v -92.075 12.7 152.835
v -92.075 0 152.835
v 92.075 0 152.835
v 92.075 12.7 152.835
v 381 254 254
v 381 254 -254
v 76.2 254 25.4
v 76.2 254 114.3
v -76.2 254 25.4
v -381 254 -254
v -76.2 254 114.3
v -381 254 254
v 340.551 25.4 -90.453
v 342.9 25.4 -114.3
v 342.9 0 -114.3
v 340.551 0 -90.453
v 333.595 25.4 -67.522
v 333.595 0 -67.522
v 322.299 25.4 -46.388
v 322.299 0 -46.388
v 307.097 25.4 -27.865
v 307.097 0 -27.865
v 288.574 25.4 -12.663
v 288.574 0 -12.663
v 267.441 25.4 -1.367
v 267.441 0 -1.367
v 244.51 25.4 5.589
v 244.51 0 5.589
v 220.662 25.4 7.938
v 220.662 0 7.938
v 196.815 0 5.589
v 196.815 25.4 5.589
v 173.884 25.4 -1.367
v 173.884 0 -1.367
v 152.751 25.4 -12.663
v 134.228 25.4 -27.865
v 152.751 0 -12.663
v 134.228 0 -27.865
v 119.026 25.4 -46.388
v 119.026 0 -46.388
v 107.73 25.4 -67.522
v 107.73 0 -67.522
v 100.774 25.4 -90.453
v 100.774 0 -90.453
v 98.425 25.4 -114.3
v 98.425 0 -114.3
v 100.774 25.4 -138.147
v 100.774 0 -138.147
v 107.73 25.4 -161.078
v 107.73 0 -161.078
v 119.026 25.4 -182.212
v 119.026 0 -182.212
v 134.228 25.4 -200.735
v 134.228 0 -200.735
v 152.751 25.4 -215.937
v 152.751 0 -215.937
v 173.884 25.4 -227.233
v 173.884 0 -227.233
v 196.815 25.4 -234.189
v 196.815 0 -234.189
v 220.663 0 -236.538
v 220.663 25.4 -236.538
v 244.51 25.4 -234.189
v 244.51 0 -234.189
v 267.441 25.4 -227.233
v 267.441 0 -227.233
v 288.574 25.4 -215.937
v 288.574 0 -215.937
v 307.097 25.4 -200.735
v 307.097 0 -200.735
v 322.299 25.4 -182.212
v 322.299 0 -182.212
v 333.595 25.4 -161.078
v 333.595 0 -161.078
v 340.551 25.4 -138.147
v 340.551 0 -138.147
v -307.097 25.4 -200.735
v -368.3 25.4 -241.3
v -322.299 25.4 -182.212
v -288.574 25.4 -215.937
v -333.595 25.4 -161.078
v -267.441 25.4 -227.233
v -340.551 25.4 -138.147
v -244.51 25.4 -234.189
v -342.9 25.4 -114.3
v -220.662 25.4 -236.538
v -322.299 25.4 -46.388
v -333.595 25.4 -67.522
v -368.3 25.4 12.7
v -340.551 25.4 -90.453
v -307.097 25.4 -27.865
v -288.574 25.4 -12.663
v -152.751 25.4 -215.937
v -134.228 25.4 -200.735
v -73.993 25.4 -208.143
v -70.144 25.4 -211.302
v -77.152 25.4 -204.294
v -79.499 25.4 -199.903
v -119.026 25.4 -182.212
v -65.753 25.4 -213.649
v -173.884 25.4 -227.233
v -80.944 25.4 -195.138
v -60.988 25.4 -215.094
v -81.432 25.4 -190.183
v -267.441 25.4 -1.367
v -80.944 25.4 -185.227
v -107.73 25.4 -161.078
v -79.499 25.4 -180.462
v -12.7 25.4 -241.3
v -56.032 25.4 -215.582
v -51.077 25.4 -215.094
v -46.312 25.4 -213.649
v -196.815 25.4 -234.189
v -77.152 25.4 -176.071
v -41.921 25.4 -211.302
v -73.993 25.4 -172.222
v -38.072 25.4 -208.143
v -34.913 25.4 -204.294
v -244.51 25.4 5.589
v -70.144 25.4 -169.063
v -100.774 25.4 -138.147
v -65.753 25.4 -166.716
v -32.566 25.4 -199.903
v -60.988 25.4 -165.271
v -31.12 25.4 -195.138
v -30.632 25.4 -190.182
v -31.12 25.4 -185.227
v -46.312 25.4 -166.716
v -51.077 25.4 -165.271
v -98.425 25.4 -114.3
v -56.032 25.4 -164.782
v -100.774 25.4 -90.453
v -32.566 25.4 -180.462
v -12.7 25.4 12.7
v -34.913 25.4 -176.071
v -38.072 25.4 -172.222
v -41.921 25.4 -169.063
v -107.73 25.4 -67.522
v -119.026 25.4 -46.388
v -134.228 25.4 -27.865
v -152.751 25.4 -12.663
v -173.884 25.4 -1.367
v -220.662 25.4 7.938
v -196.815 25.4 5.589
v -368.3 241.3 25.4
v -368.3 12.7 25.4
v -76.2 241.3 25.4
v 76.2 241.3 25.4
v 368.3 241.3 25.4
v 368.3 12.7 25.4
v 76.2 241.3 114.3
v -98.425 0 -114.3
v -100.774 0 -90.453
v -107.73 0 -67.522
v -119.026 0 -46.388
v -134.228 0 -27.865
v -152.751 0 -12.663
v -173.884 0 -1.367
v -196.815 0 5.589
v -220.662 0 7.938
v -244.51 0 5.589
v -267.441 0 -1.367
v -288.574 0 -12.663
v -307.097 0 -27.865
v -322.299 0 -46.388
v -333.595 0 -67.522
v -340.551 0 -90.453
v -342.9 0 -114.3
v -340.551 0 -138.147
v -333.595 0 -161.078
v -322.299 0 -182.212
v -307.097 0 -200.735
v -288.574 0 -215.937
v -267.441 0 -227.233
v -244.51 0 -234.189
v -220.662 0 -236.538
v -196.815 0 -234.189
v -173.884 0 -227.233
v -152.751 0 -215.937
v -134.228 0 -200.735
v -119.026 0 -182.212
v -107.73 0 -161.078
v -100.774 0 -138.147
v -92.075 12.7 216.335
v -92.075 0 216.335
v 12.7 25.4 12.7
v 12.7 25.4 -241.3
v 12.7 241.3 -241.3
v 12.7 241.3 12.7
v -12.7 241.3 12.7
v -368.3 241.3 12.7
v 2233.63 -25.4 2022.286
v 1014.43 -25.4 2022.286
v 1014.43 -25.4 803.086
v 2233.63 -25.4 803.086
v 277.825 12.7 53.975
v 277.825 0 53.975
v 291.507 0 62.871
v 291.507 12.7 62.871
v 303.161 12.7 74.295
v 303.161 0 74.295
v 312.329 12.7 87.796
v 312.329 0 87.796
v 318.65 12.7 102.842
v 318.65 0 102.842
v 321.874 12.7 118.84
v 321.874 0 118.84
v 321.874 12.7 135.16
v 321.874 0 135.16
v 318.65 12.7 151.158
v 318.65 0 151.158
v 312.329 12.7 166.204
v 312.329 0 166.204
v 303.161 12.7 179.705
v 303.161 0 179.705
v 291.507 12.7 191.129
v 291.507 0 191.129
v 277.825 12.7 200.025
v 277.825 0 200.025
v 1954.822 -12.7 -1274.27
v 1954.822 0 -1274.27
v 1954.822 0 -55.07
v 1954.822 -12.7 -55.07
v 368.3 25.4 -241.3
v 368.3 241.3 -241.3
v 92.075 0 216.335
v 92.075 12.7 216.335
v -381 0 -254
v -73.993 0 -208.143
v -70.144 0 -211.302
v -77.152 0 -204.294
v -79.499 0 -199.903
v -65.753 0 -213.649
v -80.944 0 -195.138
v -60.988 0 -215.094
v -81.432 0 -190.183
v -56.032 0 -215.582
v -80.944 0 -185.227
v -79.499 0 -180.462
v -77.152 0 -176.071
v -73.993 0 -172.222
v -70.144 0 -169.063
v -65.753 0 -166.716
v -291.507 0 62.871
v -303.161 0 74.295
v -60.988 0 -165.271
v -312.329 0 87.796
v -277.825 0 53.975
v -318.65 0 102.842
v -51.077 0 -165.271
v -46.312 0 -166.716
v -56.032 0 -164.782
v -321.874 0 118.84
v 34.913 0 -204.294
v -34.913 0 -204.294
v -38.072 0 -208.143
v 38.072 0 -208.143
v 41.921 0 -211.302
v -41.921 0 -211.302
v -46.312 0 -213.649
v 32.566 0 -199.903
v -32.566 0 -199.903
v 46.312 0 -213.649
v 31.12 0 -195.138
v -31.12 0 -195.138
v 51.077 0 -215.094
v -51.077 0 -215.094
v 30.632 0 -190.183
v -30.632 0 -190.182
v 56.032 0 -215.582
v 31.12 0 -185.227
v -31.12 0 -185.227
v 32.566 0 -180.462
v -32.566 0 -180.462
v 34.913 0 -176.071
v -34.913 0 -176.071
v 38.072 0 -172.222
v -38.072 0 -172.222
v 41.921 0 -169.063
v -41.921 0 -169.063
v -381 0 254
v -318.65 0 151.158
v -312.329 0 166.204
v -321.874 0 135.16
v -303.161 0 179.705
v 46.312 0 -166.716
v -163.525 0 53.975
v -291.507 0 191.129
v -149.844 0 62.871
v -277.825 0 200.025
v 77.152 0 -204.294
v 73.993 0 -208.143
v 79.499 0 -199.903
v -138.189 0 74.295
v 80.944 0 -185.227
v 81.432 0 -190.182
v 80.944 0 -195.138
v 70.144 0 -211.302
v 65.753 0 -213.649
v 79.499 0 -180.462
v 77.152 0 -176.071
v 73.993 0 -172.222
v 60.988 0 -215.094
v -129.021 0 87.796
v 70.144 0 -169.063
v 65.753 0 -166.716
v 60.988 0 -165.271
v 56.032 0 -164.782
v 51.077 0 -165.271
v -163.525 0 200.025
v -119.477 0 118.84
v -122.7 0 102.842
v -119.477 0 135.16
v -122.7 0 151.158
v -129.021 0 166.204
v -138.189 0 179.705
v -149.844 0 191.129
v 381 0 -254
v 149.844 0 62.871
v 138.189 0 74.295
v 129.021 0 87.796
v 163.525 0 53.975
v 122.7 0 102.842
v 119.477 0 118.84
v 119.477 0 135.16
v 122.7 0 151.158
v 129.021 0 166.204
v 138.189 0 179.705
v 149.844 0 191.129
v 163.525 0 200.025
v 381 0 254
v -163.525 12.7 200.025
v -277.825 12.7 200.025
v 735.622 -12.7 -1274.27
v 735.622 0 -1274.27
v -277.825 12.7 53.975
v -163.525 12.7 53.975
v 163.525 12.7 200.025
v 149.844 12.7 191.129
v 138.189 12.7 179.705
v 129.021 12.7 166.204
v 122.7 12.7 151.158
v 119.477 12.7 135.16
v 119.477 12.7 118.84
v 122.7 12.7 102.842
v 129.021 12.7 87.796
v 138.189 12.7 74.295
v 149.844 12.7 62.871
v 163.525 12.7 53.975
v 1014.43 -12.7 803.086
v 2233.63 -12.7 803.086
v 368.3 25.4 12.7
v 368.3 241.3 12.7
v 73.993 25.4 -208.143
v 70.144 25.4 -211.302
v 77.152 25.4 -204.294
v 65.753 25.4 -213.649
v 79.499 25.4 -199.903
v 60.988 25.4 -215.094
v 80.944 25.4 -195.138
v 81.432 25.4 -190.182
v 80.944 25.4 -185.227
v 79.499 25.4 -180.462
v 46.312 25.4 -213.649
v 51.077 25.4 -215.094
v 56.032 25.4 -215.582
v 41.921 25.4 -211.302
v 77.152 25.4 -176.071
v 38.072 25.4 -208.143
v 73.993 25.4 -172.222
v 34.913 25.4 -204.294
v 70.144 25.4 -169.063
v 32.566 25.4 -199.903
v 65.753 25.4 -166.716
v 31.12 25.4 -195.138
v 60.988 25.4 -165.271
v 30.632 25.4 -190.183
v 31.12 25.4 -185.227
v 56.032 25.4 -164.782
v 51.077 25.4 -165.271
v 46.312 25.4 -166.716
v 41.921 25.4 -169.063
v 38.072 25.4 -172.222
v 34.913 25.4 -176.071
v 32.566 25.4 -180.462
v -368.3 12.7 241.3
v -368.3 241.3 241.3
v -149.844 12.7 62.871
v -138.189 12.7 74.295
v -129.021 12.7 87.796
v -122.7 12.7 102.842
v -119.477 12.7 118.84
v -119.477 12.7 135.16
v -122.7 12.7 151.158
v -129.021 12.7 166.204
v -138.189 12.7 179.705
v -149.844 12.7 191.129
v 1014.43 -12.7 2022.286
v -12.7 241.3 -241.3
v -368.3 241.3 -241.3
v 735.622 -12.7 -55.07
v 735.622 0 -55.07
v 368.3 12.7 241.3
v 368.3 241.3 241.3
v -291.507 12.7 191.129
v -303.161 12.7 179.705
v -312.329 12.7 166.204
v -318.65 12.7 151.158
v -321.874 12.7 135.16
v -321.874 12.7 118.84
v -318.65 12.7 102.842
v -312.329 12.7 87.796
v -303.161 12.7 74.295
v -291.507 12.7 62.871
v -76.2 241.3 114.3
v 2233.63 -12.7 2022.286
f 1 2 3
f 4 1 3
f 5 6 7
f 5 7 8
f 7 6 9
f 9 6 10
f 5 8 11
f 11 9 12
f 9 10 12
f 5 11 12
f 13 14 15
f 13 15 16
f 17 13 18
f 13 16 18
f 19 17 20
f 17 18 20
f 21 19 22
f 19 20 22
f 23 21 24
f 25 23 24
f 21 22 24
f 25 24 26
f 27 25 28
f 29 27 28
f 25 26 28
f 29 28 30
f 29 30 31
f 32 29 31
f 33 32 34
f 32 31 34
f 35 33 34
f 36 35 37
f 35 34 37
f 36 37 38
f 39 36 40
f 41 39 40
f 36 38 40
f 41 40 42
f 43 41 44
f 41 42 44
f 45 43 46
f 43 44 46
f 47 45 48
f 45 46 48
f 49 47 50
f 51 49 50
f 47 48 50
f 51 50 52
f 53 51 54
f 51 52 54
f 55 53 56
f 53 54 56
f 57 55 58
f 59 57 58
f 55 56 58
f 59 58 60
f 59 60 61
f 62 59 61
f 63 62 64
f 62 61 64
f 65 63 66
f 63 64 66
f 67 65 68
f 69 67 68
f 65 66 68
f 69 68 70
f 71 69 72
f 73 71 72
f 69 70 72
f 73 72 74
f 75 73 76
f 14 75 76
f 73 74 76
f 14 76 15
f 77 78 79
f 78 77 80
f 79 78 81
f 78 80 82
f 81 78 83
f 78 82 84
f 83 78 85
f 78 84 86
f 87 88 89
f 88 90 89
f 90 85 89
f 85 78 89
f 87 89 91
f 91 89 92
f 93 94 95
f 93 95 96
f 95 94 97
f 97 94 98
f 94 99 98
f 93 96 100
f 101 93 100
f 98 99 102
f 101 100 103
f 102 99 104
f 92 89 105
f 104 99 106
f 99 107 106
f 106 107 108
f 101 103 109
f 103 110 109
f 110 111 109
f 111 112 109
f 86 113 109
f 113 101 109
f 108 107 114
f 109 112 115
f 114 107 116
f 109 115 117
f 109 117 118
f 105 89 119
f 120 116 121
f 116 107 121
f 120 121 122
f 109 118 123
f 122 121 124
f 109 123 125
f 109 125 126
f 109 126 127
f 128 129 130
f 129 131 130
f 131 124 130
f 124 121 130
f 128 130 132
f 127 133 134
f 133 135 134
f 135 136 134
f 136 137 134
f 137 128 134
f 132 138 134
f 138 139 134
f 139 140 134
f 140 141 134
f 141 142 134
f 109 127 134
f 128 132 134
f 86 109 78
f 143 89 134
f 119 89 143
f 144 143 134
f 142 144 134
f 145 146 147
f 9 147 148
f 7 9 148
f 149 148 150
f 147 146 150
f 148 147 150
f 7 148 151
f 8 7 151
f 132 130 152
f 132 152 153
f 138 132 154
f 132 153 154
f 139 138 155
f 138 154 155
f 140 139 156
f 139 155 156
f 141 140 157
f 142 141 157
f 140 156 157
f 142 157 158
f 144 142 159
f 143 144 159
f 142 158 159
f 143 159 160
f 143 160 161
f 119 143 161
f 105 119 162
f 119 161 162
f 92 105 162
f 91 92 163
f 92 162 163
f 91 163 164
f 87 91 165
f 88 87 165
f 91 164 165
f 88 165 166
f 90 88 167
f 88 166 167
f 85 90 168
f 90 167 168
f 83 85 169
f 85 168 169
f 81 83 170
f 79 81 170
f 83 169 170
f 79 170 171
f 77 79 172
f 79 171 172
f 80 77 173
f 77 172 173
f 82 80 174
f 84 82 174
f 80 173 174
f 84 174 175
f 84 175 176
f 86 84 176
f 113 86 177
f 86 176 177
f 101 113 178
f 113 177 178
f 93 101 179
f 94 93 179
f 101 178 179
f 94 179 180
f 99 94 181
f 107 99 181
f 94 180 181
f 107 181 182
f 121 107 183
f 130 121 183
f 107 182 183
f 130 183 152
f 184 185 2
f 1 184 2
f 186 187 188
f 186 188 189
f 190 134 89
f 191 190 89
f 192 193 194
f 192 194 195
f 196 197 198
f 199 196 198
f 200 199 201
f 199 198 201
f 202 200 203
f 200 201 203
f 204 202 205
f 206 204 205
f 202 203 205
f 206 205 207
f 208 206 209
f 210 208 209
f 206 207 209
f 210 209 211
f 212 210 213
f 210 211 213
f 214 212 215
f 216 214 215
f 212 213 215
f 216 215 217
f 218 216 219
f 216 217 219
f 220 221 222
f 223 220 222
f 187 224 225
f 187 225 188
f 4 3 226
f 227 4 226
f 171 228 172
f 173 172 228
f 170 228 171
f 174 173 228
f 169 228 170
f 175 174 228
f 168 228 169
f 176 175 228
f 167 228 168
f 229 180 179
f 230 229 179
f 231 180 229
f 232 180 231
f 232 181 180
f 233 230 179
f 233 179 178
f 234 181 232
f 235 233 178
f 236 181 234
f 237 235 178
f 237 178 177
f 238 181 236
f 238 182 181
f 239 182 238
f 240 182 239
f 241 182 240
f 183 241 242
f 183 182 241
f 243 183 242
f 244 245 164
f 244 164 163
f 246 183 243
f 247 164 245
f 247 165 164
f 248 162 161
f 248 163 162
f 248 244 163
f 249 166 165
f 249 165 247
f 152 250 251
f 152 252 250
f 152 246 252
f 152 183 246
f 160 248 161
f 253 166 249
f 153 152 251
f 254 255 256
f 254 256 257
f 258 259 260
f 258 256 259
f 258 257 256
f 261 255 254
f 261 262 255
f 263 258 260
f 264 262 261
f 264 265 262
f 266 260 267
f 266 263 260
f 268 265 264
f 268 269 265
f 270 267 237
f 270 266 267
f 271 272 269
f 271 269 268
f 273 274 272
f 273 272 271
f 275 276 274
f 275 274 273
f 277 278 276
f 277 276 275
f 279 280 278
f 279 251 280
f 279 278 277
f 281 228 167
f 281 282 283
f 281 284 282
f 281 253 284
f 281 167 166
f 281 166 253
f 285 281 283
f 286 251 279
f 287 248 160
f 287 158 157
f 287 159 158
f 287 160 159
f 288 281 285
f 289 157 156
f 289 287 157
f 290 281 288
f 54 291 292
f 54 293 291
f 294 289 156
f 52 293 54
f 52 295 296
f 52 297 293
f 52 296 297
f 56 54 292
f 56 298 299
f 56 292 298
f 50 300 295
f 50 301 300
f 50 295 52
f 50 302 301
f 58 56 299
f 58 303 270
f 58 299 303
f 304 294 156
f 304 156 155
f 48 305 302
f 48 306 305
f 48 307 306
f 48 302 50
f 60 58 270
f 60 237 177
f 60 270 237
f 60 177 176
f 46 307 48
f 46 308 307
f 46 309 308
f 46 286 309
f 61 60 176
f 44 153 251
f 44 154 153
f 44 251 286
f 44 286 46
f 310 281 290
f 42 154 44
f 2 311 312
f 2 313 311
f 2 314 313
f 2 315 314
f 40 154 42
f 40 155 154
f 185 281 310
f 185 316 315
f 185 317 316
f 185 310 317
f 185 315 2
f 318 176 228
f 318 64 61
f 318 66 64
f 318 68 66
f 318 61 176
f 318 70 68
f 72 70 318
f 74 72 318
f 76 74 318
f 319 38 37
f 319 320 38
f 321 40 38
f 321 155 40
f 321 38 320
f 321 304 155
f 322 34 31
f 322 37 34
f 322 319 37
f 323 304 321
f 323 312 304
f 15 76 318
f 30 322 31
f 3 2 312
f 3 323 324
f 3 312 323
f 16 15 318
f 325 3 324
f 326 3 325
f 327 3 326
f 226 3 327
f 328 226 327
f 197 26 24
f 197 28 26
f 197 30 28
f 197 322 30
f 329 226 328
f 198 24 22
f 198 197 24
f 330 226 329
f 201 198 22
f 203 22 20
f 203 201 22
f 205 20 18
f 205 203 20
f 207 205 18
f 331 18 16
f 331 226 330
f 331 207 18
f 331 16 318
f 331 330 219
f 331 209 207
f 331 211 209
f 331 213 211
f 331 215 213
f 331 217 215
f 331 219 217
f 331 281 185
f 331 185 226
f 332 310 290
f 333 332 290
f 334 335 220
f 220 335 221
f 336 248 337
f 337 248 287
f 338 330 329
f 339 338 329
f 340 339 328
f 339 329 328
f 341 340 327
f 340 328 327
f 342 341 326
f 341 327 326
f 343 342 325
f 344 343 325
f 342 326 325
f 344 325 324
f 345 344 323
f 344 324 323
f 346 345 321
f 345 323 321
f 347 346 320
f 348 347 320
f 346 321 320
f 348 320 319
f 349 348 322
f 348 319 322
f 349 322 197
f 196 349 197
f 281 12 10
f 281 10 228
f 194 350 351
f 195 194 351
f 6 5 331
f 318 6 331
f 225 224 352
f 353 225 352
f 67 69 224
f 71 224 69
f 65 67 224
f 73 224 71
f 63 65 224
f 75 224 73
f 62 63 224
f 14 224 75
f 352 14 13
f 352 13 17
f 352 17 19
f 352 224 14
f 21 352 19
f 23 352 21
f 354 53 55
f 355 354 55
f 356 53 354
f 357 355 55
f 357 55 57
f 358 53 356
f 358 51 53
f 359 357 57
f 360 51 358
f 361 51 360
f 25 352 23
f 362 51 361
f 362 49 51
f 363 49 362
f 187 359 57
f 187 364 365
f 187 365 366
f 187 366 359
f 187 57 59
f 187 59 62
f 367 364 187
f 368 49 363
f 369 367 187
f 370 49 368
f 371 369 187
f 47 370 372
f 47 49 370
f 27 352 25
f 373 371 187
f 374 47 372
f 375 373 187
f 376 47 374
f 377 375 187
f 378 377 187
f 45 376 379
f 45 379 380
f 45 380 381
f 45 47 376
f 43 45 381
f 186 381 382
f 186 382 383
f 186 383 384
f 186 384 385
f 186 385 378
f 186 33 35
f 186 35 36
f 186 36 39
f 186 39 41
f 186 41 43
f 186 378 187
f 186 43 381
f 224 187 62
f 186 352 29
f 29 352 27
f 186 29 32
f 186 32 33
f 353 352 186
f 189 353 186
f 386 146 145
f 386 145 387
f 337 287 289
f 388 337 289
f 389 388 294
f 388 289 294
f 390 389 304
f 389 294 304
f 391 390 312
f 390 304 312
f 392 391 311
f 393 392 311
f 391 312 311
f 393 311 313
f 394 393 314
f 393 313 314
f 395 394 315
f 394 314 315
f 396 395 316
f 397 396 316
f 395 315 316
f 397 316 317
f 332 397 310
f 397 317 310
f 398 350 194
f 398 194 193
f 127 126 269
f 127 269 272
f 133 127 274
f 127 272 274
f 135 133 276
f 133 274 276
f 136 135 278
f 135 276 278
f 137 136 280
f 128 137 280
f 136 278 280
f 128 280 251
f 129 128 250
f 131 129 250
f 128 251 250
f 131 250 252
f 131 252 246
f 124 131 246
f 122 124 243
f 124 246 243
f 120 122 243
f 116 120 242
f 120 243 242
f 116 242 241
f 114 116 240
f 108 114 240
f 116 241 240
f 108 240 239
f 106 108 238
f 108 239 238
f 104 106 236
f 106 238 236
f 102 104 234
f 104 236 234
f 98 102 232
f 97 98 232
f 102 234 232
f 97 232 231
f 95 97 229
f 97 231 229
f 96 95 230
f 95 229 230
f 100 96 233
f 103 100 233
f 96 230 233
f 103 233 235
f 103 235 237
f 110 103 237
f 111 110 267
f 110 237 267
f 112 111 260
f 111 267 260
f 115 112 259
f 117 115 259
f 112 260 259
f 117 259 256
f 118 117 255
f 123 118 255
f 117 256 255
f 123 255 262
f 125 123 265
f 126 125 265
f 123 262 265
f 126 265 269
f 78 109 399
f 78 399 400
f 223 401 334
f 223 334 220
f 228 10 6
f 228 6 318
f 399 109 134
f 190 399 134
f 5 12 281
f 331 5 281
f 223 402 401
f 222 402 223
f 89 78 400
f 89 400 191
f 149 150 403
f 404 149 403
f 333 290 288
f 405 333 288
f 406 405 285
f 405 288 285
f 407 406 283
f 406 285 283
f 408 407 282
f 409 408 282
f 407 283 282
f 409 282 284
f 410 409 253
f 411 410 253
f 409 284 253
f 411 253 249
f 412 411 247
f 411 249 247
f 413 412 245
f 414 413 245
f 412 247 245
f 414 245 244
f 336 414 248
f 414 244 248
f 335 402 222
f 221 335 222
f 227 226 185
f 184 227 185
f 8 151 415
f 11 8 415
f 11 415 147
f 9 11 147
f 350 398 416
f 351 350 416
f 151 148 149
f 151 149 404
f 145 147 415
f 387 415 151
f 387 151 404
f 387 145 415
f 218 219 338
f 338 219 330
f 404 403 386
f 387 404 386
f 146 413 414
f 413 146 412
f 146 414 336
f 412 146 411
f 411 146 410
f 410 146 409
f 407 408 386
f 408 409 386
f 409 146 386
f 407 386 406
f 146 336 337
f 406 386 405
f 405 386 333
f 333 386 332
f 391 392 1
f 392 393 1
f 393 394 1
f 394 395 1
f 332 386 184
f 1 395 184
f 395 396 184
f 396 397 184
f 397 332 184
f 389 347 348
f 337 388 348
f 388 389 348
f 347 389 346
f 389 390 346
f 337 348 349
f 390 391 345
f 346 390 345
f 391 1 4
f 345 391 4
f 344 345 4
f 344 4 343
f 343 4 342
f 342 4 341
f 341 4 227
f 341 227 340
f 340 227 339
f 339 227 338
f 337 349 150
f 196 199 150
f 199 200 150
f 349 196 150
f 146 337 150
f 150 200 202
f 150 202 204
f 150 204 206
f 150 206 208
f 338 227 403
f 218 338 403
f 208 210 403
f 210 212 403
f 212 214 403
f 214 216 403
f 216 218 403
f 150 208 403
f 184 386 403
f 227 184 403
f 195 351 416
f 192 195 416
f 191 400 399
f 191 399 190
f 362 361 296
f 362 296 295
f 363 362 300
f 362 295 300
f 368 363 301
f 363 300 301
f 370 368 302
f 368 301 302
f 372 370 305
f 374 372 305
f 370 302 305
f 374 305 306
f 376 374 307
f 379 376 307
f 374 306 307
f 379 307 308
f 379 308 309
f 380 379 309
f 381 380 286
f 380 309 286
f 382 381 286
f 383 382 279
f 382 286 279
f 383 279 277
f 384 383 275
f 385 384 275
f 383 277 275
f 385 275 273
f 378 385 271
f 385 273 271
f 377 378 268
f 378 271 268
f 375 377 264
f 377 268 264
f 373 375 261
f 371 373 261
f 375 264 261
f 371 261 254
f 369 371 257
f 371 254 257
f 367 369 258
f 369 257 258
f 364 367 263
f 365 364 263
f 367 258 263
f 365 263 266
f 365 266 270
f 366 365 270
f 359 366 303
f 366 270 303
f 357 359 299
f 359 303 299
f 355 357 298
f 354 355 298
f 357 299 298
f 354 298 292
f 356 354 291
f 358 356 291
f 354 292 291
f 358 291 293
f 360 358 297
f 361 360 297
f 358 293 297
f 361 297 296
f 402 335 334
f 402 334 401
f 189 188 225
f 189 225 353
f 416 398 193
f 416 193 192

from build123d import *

# Parameters (mm, degrees)
F0_W      = 762
F0_H      = 508
F1_DEPTH  = 12.7
F2_W      = 762
F2_H      = 508
F2_W_2    = 355.6
F2_H_2    = 254
F2_W_3    = 736.6
F2_H_3    = 215.9
F3_DEPTH  = 228.6
F4_W      = 355.6
F4_H      = 254
F5_DEPTH  = 12.7
F6_DEPTH  = 12.7
F7_R      = 122.2375
F8_DEPTH  = 25.4
F9_R      = 25.4
F10_DEPTH = 25.4
F12_DEPTH = 25.4
F14_DEPTH = 12.7
F15_W     = 12.7
F15_H     = 508
F16_DEPTH = 762
F18_DEPTH = 12.7
F19_W     = 1219.2
F19_H     = 1219.2
F20_DEPTH = 12.7
F21_W     = 1219.2
F21_H     = 1219.2
F22_DEPTH = 12.7


with BuildPart() as f1:
    # F0 (on Front) → F1 (new body)
    with BuildSketch(Plane.XZ):
        Rectangle(F0_W, F0_H)
    extrude(amount=-F1_DEPTH)

    # F2 (on face) → F3 (join)
    with BuildSketch(Plane(origin=(0, 12.7, 0), x_dir=(-1, 0, 0), z_dir=(0, 1, 0))):
        Rectangle(F2_W, F2_H)
        with Locations((-190.5, -114.3)):
            Rectangle(F2_W_2, F2_H_2, mode=Mode.SUBTRACT)
        with Locations((190.5, -114.3)):
            Rectangle(F2_W_2, F2_H_2, mode=Mode.SUBTRACT)
        with Locations((0, 133.35)):
            Rectangle(F2_W_3, F2_H_3, mode=Mode.SUBTRACT)
    extrude(amount=F3_DEPTH)

    # F4 (on face) → F5 (join)
    with BuildSketch(Plane(origin=(0, 12.7, 0), x_dir=(-1, 0, 0), z_dir=(0, 1, 0))):
        with Locations((-190.5, -114.3)):
            Rectangle(F4_W, F4_H)
    extrude(amount=F5_DEPTH)

    # F6 (add): a face of the model
    f6_faces = [f1.faces().sort_by_distance(p)[0] for p in [
        (-190.5, 12.7, -114.3),
    ]]
    extrude(f6_faces, amount=F6_DEPTH)

    # F7 (on face) → F8 (cut)
    with BuildSketch(Plane.XZ):
        with Locations((-220.6625, -114.3)):
            Circle(F7_R)
        with Locations((220.6625, -114.3)):
            Circle(F7_R)
    extrude(amount=-F8_DEPTH, mode=Mode.SUBTRACT)

    # F9 (on face) → F10 (cut)
    with BuildSketch(Plane.XZ):
        with Locations((-56.0324, -190.1825)):
            Circle(F9_R)
        with Locations((56.0324, -190.1825)):
            Circle(F9_R)
    extrude(amount=-F10_DEPTH, mode=Mode.SUBTRACT)

    # F11 (on face) → F12 (cut)
    with BuildSketch(Plane.XZ):
        Polygon((92.075, 216.3353095055), (0, 216.3353095055), (-92.075, 216.3353095055), (-92.075, 152.8353095055), (0, 152.8353095055), (92.075, 152.8353095055), align=None)
    extrude(amount=-F12_DEPTH, mode=Mode.SUBTRACT)

    # F13 (on face) → F14 (cut)
    with BuildSketch(Plane.XZ):
        with BuildLine():
            Line((-277.8252, 53.975), (-220.6752, 53.975))
            Line((-220.6752, 53.975), (-163.5252, 53.975))
            ThreePointArc((-163.5252, 53.975), (-119.0705820918, 127), (-163.5252, 200.025))
            Line((-163.5252, 200.025), (-220.6752, 200.025))
            Line((-220.6752, 200.025), (-277.8252, 200.025))
            ThreePointArc((-277.8252, 200.025), (-322.2798179082, 127), (-277.8252, 53.975))
        make_face()
        with BuildLine():
            ThreePointArc((163.5252, 200.025), (119.0705820918, 127), (163.5252, 53.975))
            Line((163.5252, 53.975), (220.6752, 53.975))
            Line((220.6752, 53.975), (277.8252, 53.975))
            ThreePointArc((277.8252, 53.975), (322.2798179082, 127), (277.8252, 200.025))
            Line((277.8252, 200.025), (220.6752, 200.025))
            Line((220.6752, 200.025), (163.5252, 200.025))
        make_face()
    extrude(amount=-F14_DEPTH, mode=Mode.SUBTRACT)

    # F15 (on face) → F16 (join)
    with BuildSketch(Plane(origin=(-381, 0, 0), x_dir=(0, -1, 0), z_dir=(-1, 0, 0))):
        with Locations((-247.65, 0)):
            Rectangle(F15_W, F15_H)
    extrude(amount=-F16_DEPTH)

    # F17 (on face) → F18 (cut)
    with BuildSketch(Plane.XZ.offset(-241.3)):
        Polygon((-76.2, 25.4), (0, 25.4), (76.2, 25.4), (76.2, 69.85), (76.2, 114.3), (-76.2, 114.3), (-76.2, 69.85), align=None)
    extrude(amount=-F18_DEPTH, mode=Mode.SUBTRACT)


with BuildPart() as f20:
    # F19 (on face) → F20 (new body)
    with BuildSketch(Plane.XZ):
        with Locations((1345.2215790749, -664.6697623745)):
            Rectangle(F19_W, F19_H)
    extrude(amount=F20_DEPTH)


with BuildPart() as f22:
    # F21 (on face) → F22 (new body)
    with BuildSketch(Plane.XZ.offset(12.7)):
        with Locations((1624.0296065807, 1412.6862236522)):
            Rectangle(F21_W, F21_H)
    extrude(amount=F22_DEPTH)


solid = Compound([f1.part, f20.part, f22.part])
